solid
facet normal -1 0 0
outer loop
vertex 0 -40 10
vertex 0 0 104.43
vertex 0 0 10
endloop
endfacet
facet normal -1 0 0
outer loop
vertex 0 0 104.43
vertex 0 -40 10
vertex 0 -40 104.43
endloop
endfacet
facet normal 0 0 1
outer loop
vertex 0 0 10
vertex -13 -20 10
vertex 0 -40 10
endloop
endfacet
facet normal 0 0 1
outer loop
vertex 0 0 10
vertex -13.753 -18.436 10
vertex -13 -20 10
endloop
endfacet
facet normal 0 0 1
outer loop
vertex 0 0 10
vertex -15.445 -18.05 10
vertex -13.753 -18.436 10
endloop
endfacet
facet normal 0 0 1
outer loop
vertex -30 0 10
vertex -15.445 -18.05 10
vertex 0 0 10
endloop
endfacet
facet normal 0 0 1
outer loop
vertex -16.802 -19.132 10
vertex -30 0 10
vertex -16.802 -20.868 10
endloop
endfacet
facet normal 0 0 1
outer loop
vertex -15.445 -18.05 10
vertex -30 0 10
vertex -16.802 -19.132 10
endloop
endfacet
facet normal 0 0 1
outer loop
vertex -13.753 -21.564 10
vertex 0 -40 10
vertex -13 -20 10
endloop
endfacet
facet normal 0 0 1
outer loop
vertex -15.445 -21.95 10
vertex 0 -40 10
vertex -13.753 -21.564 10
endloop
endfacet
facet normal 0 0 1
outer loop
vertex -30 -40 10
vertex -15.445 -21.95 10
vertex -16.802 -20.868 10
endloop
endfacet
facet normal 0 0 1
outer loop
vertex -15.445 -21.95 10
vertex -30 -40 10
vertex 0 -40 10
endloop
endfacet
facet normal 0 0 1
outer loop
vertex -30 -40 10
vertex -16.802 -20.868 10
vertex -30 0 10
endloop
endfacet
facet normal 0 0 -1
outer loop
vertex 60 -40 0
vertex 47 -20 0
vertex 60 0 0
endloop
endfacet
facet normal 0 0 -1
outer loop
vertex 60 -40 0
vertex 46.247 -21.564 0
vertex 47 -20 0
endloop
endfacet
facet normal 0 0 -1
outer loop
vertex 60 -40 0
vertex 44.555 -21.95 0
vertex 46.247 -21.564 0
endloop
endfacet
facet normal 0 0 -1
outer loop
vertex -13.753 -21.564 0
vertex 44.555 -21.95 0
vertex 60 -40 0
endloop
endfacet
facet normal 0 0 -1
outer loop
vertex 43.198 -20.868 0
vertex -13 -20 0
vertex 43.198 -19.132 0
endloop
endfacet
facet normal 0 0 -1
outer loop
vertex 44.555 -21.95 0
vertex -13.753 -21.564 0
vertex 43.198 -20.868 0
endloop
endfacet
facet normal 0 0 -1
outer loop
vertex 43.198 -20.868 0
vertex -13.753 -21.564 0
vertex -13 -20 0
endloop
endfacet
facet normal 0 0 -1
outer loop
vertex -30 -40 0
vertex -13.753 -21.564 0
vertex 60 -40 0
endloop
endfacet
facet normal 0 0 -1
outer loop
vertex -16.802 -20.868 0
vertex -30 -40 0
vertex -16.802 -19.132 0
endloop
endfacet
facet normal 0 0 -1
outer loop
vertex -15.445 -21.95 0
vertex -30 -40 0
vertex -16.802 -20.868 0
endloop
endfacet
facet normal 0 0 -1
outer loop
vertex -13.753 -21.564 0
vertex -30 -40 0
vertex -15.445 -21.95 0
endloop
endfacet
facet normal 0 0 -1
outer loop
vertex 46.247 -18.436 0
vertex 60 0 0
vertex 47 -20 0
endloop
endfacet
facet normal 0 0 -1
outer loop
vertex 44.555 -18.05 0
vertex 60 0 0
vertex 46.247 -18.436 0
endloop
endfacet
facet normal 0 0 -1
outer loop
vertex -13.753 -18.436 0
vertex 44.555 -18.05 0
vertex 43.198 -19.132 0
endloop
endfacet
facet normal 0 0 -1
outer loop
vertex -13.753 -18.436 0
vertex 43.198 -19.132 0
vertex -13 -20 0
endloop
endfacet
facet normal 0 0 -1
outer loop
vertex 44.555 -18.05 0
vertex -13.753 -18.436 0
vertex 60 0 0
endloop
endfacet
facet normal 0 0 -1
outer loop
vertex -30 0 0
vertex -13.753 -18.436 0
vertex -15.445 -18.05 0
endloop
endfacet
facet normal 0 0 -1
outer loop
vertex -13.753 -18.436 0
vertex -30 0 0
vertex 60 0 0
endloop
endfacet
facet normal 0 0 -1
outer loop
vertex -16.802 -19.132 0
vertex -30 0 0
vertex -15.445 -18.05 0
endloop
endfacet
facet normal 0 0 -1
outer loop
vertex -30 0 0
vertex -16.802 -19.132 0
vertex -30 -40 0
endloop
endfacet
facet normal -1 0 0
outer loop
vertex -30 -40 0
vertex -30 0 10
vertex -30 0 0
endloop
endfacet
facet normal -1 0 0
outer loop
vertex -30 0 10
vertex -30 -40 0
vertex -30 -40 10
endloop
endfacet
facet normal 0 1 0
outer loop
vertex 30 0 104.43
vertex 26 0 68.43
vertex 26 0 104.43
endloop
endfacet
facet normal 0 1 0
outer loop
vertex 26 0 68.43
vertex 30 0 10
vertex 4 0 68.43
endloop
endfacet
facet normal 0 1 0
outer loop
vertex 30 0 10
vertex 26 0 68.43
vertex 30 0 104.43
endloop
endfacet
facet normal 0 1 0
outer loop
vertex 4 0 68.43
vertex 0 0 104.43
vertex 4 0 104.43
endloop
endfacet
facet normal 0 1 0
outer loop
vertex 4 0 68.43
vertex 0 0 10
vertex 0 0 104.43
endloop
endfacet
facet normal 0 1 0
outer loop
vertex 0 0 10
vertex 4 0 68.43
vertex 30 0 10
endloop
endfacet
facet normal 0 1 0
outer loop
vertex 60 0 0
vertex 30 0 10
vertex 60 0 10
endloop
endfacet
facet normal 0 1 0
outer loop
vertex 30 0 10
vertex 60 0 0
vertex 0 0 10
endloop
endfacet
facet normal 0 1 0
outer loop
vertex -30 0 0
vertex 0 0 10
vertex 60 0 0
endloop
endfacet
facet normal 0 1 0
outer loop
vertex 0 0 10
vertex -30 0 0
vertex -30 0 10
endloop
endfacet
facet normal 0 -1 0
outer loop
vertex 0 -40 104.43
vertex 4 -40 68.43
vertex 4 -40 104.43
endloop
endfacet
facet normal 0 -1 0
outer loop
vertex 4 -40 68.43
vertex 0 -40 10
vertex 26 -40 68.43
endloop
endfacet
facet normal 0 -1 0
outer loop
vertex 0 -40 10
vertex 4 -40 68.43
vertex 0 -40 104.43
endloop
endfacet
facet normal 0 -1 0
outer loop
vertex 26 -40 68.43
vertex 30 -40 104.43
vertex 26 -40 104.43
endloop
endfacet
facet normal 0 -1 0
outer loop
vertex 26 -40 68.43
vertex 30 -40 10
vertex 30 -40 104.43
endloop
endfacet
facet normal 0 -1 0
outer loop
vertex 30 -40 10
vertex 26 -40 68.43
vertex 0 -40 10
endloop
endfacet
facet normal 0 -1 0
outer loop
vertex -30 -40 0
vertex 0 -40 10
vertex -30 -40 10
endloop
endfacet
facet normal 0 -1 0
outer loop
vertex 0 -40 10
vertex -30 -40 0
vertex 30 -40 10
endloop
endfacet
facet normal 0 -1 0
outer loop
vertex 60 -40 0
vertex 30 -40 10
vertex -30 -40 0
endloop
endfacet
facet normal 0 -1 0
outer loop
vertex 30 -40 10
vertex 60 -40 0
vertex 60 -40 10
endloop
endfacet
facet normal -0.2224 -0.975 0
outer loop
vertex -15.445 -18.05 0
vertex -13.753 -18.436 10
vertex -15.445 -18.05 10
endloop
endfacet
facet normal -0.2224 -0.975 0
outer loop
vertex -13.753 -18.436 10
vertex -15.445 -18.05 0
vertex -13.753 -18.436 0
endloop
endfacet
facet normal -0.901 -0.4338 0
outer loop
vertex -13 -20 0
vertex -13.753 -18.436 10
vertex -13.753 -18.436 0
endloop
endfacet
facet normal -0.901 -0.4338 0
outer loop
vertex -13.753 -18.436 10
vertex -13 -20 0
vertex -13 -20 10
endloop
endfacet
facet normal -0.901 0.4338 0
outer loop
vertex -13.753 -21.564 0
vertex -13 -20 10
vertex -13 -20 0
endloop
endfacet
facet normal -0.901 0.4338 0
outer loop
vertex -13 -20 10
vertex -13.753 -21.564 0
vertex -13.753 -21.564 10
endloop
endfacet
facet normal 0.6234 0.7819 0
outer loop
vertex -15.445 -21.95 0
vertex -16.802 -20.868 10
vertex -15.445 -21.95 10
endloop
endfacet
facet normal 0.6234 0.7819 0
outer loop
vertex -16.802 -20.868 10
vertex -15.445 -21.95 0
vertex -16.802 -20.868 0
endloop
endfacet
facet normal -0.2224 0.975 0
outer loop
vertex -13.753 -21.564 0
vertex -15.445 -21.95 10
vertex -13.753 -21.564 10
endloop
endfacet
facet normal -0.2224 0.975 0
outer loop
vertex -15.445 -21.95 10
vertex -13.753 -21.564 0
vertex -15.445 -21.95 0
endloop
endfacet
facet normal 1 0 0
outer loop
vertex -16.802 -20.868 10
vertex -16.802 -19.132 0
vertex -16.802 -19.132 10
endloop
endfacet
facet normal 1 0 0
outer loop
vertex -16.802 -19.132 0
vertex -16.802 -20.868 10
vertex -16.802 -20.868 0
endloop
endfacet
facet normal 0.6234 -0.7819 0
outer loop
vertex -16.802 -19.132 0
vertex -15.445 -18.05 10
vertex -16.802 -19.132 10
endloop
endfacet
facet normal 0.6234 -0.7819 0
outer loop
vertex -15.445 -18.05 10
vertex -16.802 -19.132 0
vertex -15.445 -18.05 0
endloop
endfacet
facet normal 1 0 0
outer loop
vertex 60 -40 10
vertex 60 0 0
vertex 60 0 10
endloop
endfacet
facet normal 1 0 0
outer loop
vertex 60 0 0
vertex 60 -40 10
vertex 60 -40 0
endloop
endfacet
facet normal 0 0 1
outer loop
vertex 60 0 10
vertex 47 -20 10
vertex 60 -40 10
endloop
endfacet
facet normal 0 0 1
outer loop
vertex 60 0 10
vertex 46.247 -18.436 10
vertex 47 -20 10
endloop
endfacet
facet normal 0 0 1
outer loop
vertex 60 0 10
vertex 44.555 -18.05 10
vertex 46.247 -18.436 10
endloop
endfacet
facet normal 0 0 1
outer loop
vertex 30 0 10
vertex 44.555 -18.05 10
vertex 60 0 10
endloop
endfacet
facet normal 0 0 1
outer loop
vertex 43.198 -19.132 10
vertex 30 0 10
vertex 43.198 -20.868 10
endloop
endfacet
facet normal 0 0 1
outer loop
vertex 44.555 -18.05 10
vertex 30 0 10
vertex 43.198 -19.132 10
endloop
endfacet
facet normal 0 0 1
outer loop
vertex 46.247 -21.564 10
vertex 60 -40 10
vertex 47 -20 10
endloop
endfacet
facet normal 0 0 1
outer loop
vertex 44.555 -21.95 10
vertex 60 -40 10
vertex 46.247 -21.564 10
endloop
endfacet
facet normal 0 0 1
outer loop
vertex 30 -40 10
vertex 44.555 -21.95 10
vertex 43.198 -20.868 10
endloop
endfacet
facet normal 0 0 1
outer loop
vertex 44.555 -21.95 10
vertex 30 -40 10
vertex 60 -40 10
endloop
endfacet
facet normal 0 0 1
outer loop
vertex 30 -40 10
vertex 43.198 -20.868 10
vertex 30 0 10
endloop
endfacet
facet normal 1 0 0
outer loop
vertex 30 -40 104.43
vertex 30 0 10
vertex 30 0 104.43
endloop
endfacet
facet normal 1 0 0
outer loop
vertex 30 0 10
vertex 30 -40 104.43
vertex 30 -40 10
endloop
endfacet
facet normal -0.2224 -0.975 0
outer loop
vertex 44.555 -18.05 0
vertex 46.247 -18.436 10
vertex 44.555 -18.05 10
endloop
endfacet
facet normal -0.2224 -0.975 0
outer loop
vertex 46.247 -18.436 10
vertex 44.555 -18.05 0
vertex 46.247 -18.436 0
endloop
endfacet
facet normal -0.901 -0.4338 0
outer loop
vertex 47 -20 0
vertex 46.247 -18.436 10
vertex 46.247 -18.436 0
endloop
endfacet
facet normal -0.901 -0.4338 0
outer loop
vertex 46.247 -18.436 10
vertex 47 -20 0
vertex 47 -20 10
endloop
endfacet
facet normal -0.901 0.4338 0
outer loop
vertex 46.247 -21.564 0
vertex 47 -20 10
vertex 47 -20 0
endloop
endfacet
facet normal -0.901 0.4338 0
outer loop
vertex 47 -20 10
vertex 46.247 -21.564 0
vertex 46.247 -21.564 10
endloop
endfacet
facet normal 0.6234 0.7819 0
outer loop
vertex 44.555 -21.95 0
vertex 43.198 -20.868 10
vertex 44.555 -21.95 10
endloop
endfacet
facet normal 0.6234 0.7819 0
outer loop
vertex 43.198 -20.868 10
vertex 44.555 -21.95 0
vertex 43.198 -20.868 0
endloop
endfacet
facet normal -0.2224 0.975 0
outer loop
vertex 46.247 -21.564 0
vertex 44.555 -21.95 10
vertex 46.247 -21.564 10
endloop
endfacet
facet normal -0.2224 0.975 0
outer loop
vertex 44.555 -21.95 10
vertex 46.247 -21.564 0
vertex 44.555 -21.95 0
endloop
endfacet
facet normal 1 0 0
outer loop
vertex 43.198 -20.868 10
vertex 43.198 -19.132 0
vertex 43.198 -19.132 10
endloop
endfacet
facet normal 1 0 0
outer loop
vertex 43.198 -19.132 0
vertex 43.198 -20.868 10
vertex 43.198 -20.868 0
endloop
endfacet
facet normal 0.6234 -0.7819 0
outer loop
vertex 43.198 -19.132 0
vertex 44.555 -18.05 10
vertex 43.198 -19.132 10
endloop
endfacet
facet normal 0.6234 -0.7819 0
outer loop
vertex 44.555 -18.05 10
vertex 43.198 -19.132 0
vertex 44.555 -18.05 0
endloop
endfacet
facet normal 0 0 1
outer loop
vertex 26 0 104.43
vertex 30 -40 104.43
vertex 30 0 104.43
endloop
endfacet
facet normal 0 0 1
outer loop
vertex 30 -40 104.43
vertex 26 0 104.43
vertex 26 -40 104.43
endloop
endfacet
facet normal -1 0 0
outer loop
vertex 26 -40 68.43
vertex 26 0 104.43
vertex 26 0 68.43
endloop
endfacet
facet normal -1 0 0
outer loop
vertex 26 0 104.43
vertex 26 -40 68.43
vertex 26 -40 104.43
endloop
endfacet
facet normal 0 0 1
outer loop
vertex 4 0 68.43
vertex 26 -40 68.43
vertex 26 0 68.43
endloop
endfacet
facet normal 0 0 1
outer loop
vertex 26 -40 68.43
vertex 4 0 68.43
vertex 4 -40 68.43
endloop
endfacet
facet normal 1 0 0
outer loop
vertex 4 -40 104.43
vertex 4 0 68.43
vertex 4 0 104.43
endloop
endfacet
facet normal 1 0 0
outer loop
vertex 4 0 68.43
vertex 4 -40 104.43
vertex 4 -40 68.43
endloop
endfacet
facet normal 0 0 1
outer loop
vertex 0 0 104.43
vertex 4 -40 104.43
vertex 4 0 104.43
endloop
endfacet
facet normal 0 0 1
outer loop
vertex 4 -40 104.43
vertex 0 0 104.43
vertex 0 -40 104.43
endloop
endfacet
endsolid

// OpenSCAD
// file: fixation.scad
module fixation() {
    difference(){
        translate([-30,-40,0])
            cube([30,40,10]);
        translate([-15,-20,-1])
            cylinder(20,2,2);
        
    }
    difference(){
        translate([30,-40,0])
            cube([30,40,10]);
        translate([45,-20,-1])
            cylinder(20,2,2);
    }
   
}
// main file
include <fixation.scad>

rotate([90,0,0])
    linear_extrude (height=40, $fn = 200)
        import (file="clips.dxf", layer="1", $fn=200);

fixation();
